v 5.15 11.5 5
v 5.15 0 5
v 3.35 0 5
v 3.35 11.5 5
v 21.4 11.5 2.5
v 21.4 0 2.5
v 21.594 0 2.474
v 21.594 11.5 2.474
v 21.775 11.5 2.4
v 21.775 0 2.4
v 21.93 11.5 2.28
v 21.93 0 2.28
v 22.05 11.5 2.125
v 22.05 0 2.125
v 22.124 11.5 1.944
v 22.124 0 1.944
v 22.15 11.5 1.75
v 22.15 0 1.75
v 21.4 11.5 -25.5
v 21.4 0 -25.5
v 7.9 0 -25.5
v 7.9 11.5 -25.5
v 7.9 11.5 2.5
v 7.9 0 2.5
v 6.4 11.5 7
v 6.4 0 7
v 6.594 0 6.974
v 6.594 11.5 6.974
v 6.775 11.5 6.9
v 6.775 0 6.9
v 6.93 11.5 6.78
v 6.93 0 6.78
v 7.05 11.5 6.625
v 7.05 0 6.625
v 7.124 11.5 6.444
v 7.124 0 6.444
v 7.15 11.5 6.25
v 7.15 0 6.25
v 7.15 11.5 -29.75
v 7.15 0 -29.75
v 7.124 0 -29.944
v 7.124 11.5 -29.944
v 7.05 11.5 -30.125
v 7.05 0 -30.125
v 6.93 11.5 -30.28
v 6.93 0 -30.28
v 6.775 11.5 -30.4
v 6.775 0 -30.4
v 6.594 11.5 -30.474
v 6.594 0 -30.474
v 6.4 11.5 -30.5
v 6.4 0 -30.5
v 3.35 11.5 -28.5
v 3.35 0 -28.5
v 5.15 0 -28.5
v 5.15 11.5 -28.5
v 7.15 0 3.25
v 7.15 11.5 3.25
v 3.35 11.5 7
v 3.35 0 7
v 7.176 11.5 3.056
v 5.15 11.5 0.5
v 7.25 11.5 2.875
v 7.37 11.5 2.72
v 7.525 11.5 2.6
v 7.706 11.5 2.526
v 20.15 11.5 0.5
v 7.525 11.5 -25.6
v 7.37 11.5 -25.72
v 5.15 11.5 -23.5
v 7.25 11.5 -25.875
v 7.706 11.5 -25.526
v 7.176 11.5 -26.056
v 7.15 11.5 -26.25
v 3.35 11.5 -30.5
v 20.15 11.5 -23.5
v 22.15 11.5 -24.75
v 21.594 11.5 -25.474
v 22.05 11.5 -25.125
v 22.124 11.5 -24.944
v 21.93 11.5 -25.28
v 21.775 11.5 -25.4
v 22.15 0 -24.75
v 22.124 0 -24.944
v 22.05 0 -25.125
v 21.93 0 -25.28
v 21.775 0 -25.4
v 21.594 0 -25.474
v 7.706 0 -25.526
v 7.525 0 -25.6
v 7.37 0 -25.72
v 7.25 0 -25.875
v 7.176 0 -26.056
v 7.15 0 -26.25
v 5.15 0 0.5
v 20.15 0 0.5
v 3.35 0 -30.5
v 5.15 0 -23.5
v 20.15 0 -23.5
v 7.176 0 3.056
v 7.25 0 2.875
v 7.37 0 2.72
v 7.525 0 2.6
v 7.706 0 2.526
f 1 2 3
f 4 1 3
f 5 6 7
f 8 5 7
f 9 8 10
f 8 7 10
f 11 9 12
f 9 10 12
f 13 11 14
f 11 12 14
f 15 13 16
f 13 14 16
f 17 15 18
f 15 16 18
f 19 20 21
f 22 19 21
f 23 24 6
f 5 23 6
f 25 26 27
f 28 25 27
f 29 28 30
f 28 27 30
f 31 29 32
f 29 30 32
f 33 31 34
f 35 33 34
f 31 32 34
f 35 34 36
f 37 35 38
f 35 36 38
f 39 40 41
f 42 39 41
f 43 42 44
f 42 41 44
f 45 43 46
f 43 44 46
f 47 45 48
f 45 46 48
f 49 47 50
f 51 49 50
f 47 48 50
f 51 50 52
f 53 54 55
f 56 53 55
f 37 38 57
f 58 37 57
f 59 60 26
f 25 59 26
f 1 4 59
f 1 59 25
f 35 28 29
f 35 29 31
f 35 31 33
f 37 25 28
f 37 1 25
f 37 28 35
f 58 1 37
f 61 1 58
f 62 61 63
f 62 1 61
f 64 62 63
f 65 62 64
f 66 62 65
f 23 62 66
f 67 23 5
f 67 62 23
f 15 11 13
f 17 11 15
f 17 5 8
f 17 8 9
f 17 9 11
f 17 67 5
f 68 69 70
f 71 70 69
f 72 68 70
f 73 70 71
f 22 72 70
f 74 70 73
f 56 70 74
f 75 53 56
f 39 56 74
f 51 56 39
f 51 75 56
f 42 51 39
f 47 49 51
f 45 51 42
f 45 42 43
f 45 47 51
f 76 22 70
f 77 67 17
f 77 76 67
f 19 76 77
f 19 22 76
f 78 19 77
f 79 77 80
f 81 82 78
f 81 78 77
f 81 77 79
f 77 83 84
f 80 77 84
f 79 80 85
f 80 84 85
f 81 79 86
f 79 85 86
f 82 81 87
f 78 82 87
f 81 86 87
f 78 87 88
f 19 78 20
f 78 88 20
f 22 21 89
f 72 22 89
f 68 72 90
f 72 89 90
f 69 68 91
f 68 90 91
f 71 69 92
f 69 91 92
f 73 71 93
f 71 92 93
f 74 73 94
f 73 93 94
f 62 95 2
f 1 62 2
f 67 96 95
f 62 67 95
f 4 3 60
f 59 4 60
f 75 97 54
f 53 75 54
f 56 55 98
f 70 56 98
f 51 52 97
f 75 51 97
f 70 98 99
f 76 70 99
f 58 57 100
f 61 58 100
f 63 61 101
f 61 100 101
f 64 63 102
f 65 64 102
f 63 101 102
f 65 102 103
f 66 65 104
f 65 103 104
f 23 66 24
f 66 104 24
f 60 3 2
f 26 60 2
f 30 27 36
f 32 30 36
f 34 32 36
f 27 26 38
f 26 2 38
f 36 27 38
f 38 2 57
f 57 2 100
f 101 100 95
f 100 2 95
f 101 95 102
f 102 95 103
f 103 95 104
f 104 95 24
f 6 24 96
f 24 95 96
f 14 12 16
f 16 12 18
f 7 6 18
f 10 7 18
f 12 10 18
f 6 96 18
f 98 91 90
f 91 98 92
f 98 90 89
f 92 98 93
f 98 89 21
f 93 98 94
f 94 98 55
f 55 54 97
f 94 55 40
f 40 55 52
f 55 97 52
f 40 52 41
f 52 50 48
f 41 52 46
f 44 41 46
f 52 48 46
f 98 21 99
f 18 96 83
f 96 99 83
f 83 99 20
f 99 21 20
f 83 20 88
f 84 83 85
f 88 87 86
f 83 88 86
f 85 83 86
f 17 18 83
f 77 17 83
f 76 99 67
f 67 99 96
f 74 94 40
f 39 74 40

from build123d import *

# Parameters (mm, degrees)
BRACKET_DEPTH = 11.5


with BuildPart() as part:
    # Sketch9 → Bracket (new body)
    with BuildSketch(Plane(origin=(0, 0, 0), x_dir=(1, 0, 0), z_dir=(0, 1, 0))):
        with BuildLine():
            Line((5.15, -5), (4.65, -5))
            Line((4.65, -5), (3.35, -5))
            Line((3.35, -5), (3.35, -7))
            Line((3.35, -7), (6.4, -7))
            ThreePointArc((6.4, -7), (6.930330086, -6.780330086), (7.15, -6.25))
            Line((7.15, -6.25), (7.15, -5))
            Line((7.15, -5), (7.15, -3.25))
            ThreePointArc((7.15, -3.25), (7.369669914, -2.719669914), (7.9, -2.5))
            Line((7.9, -2.5), (21.4, -2.5))
            ThreePointArc((21.4, -2.5), (21.930330086, -2.280330086), (22.15, -1.75))
            Line((22.15, -1.75), (22.15, 24.75))
            ThreePointArc((22.15, 24.75), (21.930330086, 25.280330086), (21.4, 25.5))
            Line((21.4, 25.5), (7.9, 25.5))
            ThreePointArc((7.9, 25.5), (7.369669914, 25.719669914), (7.15, 26.25))
            Line((7.15, 26.25), (7.15, 28))
            Line((7.15, 28), (7.15, 29.75))
            ThreePointArc((7.15, 29.75), (6.930330086, 30.280330086), (6.4, 30.5))
            Line((6.4, 30.5), (5.15, 30.5))
            Line((5.15, 30.5), (3.35, 30.5))
            Line((3.35, 30.5), (3.35, 28.5))
            Line((3.35, 28.5), (5.15, 28.5))
            Line((5.15, 28.5), (5.15, 28))
            Line((5.15, 28), (5.15, 23.5))
            Line((5.15, 23.5), (20.15, 23.5))
            Line((20.15, 23.5), (20.15, -0.5))
            Line((20.15, -0.5), (5.15, -0.5))
            Line((5.15, -0.5), (5.15, -5))
        make_face()
    extrude(amount=BRACKET_DEPTH)


solid = part.part
